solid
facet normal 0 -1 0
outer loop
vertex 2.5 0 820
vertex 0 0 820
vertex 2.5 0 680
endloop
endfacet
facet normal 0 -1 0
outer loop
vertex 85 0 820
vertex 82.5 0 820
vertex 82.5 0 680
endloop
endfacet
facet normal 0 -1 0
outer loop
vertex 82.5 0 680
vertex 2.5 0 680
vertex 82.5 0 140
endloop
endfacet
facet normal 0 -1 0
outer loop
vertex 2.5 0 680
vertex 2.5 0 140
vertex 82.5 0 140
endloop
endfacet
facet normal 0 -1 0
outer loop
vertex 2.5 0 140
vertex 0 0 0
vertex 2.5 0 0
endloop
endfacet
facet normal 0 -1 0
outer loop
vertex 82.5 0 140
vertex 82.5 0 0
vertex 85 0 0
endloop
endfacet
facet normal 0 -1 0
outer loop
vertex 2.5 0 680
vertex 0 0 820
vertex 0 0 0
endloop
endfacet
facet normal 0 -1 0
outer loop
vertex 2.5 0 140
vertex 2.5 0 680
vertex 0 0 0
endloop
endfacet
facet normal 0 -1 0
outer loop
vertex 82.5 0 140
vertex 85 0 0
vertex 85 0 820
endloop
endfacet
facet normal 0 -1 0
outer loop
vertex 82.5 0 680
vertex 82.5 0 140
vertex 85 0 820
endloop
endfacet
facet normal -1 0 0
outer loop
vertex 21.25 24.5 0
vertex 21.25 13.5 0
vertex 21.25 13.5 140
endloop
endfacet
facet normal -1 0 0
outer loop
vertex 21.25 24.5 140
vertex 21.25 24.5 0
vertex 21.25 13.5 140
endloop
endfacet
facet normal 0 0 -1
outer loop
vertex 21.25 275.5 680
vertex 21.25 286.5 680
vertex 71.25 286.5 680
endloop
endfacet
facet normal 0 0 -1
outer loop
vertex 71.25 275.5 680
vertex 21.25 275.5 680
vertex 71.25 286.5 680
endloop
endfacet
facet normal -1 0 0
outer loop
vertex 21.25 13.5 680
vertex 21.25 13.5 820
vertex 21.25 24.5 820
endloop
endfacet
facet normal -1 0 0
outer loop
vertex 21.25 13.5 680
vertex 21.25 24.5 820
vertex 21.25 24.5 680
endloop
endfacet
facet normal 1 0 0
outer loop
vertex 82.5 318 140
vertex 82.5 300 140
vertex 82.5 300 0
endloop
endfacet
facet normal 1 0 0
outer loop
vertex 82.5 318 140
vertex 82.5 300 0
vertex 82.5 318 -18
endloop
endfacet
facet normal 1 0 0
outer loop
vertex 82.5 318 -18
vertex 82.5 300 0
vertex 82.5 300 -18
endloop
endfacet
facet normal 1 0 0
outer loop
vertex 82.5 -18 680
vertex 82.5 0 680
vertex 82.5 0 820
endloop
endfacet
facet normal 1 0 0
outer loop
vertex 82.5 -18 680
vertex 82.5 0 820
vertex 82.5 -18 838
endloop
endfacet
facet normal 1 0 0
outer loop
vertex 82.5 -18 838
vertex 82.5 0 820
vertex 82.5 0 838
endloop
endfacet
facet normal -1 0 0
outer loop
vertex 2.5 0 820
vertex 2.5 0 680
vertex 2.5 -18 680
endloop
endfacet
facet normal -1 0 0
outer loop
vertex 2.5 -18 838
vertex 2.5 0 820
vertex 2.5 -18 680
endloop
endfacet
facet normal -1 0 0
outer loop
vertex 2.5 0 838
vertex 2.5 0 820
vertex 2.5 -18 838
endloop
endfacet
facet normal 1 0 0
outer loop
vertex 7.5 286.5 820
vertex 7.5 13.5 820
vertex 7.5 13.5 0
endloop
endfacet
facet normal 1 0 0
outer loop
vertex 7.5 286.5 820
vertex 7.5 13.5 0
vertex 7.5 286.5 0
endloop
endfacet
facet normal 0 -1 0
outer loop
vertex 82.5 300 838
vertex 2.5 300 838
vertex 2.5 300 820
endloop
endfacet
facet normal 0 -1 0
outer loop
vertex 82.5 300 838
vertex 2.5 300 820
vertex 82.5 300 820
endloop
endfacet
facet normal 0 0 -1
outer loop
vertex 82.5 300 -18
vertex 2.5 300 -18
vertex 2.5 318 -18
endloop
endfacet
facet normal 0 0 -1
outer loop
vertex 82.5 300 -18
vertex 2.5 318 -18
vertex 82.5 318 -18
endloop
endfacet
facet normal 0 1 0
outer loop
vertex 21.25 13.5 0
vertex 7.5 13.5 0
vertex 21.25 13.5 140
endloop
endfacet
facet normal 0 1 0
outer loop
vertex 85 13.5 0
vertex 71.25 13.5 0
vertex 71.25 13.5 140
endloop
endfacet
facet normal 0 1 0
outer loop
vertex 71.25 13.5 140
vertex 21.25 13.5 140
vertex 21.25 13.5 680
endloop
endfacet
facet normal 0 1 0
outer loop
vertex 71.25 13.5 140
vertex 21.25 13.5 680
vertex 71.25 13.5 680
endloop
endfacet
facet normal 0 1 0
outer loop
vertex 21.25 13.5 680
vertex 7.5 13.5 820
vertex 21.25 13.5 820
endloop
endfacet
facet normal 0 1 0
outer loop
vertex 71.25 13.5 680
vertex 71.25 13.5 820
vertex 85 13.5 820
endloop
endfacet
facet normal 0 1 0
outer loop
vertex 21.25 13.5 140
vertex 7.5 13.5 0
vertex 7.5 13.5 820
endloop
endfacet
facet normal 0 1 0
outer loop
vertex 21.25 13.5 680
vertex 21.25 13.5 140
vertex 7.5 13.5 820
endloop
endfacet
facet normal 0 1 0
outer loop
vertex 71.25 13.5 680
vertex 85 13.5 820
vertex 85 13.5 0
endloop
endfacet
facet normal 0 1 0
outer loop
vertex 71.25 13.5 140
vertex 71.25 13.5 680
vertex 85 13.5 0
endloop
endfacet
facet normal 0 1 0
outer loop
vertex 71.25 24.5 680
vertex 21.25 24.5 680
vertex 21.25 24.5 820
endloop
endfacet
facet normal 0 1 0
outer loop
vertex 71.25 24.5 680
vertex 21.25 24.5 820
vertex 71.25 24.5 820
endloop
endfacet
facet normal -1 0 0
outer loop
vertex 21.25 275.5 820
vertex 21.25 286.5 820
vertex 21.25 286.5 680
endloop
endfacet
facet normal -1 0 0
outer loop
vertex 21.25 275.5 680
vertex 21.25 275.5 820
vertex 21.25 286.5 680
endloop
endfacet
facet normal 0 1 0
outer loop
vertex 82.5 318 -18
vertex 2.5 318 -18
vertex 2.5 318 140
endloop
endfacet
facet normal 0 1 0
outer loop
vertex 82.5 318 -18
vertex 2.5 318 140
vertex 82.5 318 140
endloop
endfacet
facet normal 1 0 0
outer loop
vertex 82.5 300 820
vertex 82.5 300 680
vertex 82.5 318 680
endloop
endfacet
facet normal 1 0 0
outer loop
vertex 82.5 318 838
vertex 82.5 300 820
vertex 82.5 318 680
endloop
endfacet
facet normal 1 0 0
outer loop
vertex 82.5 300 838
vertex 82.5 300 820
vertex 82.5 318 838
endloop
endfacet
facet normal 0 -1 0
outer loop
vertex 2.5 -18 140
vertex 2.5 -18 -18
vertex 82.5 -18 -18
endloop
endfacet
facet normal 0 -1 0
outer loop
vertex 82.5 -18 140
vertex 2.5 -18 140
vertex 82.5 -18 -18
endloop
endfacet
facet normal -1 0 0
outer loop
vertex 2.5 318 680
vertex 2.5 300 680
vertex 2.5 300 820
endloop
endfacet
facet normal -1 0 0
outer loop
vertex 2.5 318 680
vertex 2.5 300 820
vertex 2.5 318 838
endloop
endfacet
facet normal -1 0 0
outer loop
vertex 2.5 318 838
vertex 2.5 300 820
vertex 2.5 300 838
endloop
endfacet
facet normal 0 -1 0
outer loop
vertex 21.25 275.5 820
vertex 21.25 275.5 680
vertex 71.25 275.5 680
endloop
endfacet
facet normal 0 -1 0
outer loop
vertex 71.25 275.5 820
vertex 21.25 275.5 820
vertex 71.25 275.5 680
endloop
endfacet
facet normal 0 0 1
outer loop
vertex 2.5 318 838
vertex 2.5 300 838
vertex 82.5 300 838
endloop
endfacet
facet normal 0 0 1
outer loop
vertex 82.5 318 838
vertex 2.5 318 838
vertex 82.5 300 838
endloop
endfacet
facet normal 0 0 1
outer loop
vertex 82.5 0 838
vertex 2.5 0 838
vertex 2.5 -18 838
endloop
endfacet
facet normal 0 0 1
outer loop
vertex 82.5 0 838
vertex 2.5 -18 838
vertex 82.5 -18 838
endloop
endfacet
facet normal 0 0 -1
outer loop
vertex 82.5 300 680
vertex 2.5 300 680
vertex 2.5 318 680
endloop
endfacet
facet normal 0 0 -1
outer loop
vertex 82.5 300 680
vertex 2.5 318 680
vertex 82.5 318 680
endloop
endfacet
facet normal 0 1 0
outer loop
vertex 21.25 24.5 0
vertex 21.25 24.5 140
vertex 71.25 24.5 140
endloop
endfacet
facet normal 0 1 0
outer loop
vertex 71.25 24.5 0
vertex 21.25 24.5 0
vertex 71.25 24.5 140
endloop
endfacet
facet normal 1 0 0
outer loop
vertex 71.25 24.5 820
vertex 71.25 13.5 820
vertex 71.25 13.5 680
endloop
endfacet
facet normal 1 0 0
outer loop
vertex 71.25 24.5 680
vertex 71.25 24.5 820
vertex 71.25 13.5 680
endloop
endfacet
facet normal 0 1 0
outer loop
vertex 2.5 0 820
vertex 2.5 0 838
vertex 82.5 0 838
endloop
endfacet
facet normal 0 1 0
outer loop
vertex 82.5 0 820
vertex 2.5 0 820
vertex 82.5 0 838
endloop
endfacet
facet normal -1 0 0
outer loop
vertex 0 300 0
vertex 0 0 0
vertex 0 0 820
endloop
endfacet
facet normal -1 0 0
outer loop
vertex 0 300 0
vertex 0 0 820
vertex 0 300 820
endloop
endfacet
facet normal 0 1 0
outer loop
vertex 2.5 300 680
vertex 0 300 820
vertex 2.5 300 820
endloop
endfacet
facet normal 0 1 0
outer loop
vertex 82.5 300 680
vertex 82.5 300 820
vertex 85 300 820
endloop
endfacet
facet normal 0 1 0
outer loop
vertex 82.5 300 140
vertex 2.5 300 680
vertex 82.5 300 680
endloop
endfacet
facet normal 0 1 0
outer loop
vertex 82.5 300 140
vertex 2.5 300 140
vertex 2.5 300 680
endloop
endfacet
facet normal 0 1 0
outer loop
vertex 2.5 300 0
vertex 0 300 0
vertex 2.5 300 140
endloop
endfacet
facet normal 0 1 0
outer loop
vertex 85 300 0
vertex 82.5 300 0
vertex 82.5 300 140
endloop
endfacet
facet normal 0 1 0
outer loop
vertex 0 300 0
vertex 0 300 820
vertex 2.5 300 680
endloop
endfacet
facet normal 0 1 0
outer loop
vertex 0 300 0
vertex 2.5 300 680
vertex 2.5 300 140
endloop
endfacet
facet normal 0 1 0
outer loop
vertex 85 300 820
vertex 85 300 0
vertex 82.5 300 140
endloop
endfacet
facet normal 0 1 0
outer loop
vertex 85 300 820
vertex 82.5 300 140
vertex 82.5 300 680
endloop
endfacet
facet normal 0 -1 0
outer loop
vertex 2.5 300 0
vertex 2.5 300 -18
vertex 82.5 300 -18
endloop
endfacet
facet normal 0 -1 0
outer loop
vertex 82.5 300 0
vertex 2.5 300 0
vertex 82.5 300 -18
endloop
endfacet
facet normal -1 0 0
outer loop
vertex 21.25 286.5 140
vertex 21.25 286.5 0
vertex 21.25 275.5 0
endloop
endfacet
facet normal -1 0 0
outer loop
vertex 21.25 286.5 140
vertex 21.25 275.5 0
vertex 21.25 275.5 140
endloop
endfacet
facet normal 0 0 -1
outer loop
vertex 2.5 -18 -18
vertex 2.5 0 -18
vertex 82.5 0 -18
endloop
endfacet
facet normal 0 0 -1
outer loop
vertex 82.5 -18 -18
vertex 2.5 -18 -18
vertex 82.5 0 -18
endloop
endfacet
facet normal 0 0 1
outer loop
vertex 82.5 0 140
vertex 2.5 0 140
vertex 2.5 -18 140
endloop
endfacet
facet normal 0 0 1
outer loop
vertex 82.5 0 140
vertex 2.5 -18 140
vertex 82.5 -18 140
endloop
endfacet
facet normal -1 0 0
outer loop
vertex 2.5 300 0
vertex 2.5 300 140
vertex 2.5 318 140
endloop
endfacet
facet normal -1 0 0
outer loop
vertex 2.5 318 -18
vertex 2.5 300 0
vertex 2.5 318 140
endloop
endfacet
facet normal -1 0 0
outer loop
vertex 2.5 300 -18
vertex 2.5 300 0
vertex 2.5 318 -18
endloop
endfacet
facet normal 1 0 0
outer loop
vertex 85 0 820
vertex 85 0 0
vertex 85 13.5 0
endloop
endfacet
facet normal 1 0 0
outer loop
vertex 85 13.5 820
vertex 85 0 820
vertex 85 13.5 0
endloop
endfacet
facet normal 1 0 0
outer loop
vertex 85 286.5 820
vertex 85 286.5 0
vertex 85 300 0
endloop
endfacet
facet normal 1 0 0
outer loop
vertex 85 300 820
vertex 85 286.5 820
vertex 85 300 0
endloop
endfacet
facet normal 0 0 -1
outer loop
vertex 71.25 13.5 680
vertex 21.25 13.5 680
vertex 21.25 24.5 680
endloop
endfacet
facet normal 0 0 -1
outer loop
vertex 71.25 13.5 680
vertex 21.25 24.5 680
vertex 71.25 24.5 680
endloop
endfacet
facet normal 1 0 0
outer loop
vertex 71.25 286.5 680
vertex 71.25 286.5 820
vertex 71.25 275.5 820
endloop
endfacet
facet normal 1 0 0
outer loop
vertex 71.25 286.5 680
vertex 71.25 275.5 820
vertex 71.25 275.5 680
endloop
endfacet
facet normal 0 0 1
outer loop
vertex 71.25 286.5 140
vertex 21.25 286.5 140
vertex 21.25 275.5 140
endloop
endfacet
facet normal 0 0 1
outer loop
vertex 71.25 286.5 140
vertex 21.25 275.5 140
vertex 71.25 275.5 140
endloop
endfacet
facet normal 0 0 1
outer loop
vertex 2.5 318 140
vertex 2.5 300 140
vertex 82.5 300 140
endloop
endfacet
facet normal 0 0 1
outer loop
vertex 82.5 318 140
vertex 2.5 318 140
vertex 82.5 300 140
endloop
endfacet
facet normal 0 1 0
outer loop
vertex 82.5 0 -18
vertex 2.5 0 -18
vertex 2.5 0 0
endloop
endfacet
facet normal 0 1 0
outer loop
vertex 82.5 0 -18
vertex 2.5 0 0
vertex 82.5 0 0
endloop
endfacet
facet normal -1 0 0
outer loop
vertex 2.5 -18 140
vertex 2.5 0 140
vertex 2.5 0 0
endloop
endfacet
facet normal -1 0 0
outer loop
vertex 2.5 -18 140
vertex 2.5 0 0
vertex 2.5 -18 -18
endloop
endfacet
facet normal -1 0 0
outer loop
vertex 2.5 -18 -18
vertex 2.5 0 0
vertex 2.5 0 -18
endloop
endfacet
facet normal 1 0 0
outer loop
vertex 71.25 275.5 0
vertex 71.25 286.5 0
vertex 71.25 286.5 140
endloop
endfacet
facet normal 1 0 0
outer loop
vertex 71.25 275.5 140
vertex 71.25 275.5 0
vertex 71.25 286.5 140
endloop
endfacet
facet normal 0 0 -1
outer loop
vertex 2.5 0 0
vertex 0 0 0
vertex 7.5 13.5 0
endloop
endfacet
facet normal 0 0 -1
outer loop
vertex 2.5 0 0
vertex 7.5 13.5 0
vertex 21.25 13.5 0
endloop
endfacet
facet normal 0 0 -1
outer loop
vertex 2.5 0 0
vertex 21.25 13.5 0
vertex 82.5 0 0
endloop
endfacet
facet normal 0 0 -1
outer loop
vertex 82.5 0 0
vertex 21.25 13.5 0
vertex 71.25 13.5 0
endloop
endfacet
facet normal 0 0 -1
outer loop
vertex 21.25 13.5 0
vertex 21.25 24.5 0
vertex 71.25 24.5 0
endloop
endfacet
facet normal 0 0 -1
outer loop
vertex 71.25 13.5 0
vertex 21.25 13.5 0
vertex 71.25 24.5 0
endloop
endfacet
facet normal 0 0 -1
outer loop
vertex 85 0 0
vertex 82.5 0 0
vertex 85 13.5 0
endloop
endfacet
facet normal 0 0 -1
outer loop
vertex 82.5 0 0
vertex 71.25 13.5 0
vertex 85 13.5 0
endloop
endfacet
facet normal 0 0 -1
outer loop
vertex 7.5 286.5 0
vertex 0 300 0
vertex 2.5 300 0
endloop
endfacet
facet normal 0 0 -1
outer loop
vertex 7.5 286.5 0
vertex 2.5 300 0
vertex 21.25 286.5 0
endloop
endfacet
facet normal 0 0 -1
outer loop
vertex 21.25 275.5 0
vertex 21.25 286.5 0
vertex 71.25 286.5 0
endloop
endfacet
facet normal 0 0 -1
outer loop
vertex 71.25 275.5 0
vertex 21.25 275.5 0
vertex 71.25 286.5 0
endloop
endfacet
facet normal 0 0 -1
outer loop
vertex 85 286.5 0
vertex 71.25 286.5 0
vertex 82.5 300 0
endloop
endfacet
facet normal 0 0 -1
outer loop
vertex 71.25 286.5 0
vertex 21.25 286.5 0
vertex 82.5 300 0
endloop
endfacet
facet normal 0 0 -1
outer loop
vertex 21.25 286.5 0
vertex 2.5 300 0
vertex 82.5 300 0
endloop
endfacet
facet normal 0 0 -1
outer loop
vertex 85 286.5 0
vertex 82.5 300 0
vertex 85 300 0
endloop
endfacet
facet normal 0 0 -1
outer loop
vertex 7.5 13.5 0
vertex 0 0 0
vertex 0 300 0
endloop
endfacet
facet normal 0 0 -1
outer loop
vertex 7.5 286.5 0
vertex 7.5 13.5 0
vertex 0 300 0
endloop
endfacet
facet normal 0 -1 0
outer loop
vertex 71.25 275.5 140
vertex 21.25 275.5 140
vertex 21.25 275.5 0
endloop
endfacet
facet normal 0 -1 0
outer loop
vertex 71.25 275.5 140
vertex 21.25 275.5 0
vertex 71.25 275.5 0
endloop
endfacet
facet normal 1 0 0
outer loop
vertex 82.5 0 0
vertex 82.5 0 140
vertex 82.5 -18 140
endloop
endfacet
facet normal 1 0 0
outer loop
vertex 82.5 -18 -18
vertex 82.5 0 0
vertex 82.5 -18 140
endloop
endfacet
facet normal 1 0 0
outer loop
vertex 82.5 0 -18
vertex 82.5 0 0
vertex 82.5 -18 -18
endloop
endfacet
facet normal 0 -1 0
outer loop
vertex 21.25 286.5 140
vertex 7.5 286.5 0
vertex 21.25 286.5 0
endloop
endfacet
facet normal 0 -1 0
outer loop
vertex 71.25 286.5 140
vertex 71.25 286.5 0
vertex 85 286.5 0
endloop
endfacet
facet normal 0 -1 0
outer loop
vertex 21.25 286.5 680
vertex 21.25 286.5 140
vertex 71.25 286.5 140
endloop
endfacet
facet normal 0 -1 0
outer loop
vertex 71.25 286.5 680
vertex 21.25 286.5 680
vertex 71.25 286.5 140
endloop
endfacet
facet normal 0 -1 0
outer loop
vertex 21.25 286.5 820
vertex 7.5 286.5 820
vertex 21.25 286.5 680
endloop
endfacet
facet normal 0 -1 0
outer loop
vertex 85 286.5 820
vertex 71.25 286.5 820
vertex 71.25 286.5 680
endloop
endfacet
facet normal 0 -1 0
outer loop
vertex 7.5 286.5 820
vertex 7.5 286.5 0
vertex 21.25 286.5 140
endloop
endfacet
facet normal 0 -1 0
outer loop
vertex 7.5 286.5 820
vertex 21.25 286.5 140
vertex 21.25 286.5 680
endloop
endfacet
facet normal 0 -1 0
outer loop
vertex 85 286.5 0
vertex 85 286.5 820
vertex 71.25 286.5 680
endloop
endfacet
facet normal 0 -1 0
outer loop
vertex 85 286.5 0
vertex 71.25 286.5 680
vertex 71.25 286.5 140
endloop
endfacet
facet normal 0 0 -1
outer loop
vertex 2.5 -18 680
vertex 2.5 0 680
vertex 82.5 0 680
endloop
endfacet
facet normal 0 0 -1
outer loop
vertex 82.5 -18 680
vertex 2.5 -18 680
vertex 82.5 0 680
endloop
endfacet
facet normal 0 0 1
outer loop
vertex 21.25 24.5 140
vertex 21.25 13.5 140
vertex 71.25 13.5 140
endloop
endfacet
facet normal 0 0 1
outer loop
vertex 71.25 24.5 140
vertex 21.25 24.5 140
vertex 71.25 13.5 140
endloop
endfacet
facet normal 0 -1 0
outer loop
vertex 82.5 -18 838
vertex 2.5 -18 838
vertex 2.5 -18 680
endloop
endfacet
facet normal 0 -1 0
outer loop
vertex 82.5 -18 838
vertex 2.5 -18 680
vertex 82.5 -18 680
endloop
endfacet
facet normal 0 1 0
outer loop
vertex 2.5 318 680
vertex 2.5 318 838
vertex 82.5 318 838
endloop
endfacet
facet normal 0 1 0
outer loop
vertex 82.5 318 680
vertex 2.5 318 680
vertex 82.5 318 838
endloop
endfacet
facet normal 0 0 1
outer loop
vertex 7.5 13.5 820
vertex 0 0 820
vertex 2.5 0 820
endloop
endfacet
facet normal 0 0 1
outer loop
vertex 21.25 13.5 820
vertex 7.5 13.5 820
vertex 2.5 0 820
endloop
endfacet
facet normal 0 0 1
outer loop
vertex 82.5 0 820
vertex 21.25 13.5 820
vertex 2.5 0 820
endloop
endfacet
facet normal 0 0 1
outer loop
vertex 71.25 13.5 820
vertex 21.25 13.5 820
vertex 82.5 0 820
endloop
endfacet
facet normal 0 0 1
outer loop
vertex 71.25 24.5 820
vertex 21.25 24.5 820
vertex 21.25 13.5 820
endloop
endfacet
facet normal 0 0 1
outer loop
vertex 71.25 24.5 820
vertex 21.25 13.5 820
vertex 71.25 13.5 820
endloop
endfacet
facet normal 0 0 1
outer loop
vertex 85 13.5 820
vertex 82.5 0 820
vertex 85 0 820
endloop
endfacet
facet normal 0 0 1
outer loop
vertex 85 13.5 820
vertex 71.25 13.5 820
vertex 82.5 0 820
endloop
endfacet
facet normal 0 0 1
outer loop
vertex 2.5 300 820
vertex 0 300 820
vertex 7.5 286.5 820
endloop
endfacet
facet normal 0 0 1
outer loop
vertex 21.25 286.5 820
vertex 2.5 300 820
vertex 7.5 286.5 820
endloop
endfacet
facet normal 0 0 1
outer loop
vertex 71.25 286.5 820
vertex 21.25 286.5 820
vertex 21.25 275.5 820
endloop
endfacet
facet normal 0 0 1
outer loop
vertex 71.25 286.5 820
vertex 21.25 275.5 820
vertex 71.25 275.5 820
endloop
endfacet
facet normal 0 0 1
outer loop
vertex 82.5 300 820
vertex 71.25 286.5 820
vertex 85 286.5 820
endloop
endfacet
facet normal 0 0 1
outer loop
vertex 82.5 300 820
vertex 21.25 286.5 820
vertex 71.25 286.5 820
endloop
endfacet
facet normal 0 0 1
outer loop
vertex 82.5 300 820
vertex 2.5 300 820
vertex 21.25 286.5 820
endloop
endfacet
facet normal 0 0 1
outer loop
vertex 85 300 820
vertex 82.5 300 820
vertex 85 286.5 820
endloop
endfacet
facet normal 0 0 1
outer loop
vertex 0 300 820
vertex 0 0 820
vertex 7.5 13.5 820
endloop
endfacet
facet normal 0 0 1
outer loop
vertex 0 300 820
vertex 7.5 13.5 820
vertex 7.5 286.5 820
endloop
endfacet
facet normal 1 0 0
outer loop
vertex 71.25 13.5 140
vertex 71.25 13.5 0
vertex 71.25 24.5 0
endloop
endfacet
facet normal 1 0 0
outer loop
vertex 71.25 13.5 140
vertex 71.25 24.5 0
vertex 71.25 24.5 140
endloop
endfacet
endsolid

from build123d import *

# Parameters (mm, degrees)
SKETCH_1_W               = 85
SKETCH_1_H               = 300
EXTRUDE_1_DEPTH          = 820
SKETCH_2_W               = 77.5
SKETCH_2_H               = 273
CUT_EXTRUDE_1_DEPTH      = 878.282736636
SKETCH_5_W               = 50
SKETCH_5_H               = 140
EXTRUDE_3_DEPTH          = 11
SKETCH_6_W               = 80
SKETCH_6_H               = 158
EXTRUDE_4_DEPTH          = 18
MIRROR_4_COPY_1_SKETCH_W = 50
MIRROR_4_COPY_1_SKETCH_H = 140
MIRROR_4_COPY_1_DEPTH    = 11
MIRROR_4_COPY_2_SKETCH_W = 80
MIRROR_4_COPY_2_SKETCH_H = 158
MIRROR_4_COPY_2_DEPTH    = 18


with BuildPart() as part:
    # 草图1 → 凸台-拉伸1 (new body)
    with BuildSketch(Plane.XY):
        with Locations((42.5, 150)):
            Rectangle(SKETCH_1_W, SKETCH_1_H)
    extrude(amount=EXTRUDE_1_DEPTH)

    # 草图2 → 切除-拉伸1 (cut, through all)
    with BuildSketch(Plane.XY.offset(820)):
        with Locations((46.25, 150)):
            Rectangle(SKETCH_2_W, SKETCH_2_H)
    extrude(amount=-CUT_EXTRUDE_1_DEPTH, mode=Mode.SUBTRACT)

    # 草图5 → 凸台-拉伸3 (add)
    with BuildSketch(Plane.XZ.offset(-286.5)):
        with Locations((46.25, 70)):
            Rectangle(SKETCH_5_W, SKETCH_5_H)
    extrude_3 = extrude(amount=EXTRUDE_3_DEPTH)

    # 草图6 → 凸台-拉伸4 (add)
    with BuildSketch(Plane(origin=(0, 300, 0), x_dir=(1, 0, 0), z_dir=(0, 1, 0))):
        with Locations((42.5, -61)):
            Rectangle(SKETCH_6_W, SKETCH_6_H)
    extrude_4 = extrude(amount=EXTRUDE_4_DEPTH)

    # 镜向3: 凸台-拉伸3, 凸台-拉伸4 across plane
    add(extrude_3.mirror(Plane(origin=(0, 150, 0), x_dir=(0, 0, 1), z_dir=(0, -1, 0))))
    add(extrude_4.mirror(Plane(origin=(0, 150, 0), x_dir=(0, 0, 1), z_dir=(0, -1, 0))))

    # 镜向4: 凸台-拉伸3, 凸台-拉伸4 across plane
    add(extrude_3.mirror(Plane(origin=(0, 0, 410), x_dir=(1, 0, 0), z_dir=(0, 0, -1))))
    add(extrude_4.mirror(Plane(origin=(0, 0, 410), x_dir=(1, 0, 0), z_dir=(0, 0, -1))))

    # 镜向4 copy 1 sketch → 镜向4 copy 1 (add)
    with BuildSketch(Plane(origin=(0, 13.5, 820), x_dir=(1, 0, 0), z_dir=(0, 1, 0))):
        with Locations((46.25, 70)):
            Rectangle(MIRROR_4_COPY_1_SKETCH_W, MIRROR_4_COPY_1_SKETCH_H)
    extrude(amount=MIRROR_4_COPY_1_DEPTH)

    # 镜向4 copy 2 sketch → 镜向4 copy 2 (add)
    with BuildSketch(Plane(origin=(0, 0, 820), x_dir=(1, 0, 0), z_dir=(0, -1, 0))):
        with Locations((42.5, -61)):
            Rectangle(MIRROR_4_COPY_2_SKETCH_W, MIRROR_4_COPY_2_SKETCH_H)
    extrude(amount=MIRROR_4_COPY_2_DEPTH)


solid = part.part
